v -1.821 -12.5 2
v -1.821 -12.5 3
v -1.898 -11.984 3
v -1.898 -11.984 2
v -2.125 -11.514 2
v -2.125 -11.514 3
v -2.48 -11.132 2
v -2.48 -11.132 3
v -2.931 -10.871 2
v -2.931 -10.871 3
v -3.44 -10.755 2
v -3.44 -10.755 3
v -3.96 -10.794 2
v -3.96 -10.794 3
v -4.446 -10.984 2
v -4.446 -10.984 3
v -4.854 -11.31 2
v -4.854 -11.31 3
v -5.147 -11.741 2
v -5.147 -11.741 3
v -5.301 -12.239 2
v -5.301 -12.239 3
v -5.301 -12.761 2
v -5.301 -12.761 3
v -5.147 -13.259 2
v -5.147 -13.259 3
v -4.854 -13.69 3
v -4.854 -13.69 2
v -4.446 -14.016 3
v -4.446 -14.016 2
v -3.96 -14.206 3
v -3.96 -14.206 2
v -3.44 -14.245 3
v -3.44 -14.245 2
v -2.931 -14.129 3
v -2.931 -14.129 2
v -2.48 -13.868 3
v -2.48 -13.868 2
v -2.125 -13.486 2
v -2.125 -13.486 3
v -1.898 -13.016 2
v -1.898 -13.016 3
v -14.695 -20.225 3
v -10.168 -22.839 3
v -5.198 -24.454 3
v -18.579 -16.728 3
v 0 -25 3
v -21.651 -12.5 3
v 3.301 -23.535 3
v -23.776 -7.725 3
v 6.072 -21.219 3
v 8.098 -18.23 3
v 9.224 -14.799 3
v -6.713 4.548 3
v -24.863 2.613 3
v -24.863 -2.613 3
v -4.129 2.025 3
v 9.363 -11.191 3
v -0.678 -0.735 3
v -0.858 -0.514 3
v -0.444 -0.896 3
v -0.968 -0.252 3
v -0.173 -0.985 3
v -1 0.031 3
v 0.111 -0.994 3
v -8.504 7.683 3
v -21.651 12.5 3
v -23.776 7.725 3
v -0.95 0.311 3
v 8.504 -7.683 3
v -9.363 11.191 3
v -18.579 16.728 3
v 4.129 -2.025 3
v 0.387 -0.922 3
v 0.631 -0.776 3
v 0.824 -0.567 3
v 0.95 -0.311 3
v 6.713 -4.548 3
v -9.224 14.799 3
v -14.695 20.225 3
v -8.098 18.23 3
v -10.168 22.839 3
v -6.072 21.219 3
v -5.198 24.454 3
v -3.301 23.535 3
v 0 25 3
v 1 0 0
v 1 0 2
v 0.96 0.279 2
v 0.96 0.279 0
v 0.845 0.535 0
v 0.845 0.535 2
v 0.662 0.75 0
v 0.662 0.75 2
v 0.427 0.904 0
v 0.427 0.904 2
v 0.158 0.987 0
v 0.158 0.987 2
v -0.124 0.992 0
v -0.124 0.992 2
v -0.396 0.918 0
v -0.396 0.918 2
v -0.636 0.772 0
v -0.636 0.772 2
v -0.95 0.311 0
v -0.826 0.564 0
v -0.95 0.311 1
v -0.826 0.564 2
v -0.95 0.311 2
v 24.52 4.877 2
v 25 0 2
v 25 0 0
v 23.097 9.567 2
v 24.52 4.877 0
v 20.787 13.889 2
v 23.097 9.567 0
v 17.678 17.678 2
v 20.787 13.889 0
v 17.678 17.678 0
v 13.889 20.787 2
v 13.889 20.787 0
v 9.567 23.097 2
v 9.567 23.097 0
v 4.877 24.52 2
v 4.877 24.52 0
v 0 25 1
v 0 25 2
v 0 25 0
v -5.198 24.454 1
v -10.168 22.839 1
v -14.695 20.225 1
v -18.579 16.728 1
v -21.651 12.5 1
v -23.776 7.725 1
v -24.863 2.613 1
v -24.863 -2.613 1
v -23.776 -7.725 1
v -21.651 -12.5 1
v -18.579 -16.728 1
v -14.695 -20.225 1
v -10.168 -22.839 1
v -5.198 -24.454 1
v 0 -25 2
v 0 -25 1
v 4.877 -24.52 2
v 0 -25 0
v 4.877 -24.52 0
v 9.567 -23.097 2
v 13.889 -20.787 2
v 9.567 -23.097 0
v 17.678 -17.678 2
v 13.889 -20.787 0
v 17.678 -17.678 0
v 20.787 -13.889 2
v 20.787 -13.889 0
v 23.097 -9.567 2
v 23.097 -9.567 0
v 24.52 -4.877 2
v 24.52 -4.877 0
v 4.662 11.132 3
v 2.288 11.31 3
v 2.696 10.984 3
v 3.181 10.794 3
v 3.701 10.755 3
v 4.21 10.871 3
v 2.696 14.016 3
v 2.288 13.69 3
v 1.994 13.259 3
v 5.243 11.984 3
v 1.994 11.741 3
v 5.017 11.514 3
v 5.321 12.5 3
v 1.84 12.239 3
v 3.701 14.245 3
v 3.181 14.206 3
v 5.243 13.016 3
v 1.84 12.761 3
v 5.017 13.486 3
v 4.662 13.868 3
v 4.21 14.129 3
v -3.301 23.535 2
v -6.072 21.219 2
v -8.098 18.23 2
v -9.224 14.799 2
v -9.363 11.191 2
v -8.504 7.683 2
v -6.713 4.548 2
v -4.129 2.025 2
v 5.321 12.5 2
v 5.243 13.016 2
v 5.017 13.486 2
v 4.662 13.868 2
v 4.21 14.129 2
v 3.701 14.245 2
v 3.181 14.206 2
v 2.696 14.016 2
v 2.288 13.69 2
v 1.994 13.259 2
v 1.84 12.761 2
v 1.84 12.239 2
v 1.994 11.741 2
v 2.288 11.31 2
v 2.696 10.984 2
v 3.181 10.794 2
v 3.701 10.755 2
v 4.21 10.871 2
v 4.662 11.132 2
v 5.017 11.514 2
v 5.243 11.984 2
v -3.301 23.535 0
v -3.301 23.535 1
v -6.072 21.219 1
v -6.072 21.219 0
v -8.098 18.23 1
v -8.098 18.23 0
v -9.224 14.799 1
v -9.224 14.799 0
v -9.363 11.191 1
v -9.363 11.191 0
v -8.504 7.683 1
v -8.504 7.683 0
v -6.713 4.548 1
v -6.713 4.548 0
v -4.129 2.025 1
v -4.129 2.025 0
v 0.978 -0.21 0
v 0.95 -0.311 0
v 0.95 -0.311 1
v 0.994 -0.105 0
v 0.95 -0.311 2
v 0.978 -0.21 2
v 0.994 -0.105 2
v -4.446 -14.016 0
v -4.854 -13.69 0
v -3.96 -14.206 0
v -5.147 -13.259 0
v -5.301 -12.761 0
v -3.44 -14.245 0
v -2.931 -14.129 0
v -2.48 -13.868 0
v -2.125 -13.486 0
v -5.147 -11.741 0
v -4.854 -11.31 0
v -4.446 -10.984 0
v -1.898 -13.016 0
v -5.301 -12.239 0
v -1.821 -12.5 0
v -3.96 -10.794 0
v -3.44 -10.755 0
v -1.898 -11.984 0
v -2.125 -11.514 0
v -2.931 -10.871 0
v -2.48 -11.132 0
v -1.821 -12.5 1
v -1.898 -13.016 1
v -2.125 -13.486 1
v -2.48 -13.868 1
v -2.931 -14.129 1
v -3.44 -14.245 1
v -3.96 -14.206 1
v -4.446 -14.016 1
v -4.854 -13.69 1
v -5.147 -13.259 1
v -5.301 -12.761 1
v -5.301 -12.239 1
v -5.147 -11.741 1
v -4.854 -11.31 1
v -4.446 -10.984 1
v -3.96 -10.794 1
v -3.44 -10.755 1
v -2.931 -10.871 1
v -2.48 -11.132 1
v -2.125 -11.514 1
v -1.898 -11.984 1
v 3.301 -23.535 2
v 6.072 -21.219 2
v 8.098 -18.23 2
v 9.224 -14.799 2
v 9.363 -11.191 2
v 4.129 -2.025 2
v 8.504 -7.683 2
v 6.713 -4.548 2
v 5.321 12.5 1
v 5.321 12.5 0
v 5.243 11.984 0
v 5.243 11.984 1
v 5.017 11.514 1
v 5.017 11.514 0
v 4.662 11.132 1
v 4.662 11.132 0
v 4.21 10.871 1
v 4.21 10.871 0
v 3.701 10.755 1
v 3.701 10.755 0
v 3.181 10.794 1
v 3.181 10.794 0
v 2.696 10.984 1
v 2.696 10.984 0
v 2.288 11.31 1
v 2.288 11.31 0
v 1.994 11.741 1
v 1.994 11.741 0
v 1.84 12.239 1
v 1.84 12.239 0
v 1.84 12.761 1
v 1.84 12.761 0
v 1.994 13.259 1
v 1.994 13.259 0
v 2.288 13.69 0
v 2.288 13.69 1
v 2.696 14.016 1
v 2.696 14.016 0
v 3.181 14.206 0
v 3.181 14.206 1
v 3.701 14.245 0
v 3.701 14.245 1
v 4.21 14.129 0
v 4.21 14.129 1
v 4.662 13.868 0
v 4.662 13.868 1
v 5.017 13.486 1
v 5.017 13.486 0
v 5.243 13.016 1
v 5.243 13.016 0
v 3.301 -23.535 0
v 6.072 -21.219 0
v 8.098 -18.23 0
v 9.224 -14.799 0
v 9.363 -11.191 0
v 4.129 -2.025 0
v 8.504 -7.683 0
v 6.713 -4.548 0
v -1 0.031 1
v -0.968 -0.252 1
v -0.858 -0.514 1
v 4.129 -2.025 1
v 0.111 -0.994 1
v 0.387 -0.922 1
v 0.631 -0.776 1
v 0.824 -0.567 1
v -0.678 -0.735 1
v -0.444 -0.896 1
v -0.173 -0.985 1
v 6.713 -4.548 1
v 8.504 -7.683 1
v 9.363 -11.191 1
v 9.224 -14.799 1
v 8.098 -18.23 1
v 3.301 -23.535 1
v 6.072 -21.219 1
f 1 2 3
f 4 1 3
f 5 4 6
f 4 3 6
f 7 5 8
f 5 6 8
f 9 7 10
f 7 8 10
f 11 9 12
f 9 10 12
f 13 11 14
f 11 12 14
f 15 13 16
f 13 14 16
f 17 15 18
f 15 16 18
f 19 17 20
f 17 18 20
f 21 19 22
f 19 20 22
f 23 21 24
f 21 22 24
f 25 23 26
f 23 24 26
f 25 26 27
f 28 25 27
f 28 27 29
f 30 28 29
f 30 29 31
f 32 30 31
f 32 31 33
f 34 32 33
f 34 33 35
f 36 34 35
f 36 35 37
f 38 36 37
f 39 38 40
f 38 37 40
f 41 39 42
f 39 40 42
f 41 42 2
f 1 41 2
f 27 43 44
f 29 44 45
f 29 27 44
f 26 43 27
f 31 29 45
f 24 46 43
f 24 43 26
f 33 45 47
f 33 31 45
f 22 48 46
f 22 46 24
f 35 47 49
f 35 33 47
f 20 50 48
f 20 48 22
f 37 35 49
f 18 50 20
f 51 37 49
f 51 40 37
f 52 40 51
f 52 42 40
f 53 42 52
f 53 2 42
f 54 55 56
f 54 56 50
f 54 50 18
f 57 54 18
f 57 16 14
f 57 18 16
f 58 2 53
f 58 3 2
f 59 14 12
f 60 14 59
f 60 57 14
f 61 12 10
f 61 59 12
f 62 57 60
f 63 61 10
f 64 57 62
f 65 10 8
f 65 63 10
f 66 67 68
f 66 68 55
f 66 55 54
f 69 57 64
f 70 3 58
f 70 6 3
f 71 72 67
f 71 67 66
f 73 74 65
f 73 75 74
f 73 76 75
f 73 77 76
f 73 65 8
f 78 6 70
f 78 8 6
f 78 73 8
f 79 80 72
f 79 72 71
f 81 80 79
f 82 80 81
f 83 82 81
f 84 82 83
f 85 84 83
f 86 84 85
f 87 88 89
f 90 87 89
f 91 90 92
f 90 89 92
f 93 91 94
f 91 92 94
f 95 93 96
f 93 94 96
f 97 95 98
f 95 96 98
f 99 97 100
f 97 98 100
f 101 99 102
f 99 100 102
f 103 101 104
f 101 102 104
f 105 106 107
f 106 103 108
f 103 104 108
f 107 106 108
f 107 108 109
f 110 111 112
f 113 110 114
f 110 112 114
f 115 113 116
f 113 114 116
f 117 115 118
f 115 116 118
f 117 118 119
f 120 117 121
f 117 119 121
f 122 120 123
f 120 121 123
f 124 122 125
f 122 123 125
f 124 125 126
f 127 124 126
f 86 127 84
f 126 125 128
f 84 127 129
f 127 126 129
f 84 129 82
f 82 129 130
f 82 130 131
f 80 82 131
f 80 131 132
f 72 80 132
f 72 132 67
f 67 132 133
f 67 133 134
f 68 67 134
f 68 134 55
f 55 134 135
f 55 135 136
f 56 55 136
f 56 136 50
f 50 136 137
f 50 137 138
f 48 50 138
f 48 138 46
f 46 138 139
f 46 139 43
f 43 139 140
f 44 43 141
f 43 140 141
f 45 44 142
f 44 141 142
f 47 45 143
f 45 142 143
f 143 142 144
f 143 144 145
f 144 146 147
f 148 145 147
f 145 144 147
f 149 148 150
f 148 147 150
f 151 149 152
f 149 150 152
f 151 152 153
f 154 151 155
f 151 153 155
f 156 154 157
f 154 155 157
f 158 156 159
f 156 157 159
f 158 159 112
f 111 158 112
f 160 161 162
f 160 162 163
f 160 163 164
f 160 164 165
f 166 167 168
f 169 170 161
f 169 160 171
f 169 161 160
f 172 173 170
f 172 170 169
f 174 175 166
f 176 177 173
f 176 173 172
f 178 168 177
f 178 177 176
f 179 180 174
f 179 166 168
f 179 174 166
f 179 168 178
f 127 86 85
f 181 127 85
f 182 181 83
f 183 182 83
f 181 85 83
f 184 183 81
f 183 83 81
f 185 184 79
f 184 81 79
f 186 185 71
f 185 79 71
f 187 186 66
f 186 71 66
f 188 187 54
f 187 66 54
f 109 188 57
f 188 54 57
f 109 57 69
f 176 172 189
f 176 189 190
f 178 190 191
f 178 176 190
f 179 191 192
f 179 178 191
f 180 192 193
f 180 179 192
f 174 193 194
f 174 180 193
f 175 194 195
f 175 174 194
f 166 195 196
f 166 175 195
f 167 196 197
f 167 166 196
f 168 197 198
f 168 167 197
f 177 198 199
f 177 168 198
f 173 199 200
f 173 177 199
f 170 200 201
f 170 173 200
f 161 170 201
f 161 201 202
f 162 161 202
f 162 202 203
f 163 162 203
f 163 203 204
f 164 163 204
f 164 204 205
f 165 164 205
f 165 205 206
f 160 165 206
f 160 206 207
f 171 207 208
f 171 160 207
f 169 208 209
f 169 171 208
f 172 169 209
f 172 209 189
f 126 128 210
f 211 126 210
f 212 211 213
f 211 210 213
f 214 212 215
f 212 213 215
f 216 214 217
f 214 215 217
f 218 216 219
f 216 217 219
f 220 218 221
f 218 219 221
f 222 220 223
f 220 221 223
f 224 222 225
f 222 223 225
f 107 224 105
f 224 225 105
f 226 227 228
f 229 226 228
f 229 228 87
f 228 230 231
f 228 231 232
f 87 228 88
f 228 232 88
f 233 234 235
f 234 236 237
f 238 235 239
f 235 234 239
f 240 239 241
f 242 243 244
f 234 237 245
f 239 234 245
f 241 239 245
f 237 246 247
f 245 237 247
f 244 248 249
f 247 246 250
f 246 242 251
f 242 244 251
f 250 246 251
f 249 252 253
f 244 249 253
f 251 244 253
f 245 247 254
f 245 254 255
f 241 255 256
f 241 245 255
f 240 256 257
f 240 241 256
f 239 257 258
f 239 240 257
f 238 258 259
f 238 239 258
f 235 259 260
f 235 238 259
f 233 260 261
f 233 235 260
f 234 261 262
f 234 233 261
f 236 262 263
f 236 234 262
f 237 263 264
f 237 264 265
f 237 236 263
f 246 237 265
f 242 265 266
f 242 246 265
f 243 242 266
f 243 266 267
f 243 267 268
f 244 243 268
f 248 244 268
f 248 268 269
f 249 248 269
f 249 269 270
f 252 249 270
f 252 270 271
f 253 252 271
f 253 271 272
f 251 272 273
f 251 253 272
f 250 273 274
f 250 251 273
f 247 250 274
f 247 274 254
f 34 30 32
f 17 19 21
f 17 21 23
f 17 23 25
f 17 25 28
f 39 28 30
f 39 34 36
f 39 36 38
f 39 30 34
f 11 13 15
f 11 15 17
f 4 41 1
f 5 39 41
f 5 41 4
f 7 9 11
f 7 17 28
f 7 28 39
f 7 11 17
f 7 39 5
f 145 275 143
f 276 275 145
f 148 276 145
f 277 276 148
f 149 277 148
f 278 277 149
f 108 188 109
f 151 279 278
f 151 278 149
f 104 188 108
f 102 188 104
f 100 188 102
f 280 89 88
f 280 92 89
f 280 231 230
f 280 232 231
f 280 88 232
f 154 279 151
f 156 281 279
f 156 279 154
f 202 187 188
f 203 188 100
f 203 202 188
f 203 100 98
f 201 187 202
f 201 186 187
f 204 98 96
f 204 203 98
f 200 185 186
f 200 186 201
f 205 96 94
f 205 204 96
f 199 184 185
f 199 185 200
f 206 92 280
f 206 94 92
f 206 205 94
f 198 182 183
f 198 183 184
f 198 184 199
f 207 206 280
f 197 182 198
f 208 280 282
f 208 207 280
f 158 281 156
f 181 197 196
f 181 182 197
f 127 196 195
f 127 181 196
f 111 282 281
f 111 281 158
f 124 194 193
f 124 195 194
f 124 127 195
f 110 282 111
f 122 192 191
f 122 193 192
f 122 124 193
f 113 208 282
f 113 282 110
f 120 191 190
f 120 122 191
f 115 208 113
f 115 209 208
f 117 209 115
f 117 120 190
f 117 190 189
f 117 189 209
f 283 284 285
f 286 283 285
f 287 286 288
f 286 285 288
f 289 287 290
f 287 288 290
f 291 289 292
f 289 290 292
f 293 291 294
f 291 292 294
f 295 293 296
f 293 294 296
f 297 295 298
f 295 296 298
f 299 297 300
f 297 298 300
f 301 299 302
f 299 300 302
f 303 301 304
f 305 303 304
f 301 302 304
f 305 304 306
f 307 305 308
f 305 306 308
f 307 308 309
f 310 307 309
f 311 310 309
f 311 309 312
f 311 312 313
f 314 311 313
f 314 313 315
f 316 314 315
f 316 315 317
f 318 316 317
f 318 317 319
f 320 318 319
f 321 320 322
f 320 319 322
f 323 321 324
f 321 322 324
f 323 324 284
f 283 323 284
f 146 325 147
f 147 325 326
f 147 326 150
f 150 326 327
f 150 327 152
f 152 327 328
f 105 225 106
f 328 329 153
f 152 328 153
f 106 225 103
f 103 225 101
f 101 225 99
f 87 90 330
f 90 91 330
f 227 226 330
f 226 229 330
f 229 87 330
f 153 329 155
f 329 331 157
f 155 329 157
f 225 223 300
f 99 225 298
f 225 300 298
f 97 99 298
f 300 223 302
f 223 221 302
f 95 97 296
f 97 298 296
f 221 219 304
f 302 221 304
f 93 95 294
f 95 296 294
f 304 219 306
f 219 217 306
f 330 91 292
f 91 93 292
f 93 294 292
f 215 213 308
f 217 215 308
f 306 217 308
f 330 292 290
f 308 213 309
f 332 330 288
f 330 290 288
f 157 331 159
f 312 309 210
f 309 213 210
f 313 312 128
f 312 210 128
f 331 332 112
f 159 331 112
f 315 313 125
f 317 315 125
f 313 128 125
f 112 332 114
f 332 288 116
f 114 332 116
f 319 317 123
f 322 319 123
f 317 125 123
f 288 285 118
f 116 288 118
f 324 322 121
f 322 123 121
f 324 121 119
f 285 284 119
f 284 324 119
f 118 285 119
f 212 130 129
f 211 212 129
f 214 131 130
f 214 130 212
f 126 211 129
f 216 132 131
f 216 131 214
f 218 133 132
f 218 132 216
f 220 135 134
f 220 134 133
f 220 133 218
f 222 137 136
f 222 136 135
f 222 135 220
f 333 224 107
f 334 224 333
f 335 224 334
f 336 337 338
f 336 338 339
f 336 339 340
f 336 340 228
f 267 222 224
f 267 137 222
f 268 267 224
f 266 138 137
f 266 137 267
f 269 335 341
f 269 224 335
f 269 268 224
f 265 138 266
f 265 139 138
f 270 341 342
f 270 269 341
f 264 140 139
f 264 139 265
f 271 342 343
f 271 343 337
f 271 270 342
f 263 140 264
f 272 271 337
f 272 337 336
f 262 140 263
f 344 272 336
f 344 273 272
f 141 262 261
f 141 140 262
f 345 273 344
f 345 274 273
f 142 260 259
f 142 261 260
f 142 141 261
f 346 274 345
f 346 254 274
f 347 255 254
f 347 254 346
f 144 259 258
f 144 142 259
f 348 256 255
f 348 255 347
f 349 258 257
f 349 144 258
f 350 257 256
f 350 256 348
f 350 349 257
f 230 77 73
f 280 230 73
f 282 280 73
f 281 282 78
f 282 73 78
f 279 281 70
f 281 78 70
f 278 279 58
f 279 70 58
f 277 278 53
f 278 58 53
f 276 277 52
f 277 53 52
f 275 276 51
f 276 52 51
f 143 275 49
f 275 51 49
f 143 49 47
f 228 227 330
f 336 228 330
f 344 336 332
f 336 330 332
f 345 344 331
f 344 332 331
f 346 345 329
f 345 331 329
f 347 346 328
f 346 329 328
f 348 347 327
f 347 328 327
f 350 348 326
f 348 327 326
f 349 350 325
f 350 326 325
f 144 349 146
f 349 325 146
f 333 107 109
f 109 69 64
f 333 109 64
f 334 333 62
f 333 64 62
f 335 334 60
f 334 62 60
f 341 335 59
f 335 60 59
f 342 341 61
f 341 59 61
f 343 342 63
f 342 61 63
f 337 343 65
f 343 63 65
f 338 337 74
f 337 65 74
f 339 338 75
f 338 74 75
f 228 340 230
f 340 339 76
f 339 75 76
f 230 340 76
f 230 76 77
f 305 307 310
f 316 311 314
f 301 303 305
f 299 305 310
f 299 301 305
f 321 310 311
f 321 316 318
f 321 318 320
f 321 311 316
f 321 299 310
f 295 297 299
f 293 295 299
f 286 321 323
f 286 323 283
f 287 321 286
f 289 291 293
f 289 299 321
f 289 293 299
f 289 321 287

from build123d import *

# Parameters (mm, degrees)
F0_R     = 25
F1_DEPTH = 3
F2_R     = 1.75
F3_DEPTH = 1
F4_R     = 1.75
F5_DEPTH = 1
F7_DEPTH = 25


with BuildPart() as f1:
    # F0 (on Top) → F1 (new body)
    with BuildSketch(Plane.XY):
        Circle(F0_R)
    extrude(amount=F1_DEPTH)

    # F2 (on face) → F3 (cut)
    with BuildSketch(Plane.XY.offset(3)):
        with BuildLine():
            ThreePointArc((0, -25), (17.67767, -17.67767), (25, 0))
            ThreePointArc((25, 0), (17.67767, 17.67767), (0, 25))
            ThreePointArc((0, 25), (-9.429286, 12.5), (0, 0))
            ThreePointArc((0, 0), (9.429286, -12.5), (0, -25))
        make_face()
        with Locations((3.570714, 12.5)):
            Circle(F2_R, mode=Mode.SUBTRACT)
        with Locations((-3.570714, -12.5)):
            Circle(F2_R)
    extrude(amount=-F3_DEPTH, mode=Mode.SUBTRACT)

    # F4 (on face) → F5 (cut)
    with BuildSketch(Plane(origin=(0, 0, 0), x_dir=(1, 0, 0), z_dir=(0, 0, -1))):
        with BuildLine():
            ThreePointArc((0, 0), (9.429286, 12.5), (0, 25))
            ThreePointArc((0, 25), (-25, 0), (0, -25))
            ThreePointArc((0, -25), (-9.429286, -12.5), (0, 0))
        make_face()
        with Locations((-3.570714, 12.5)):
            Circle(F4_R, mode=Mode.SUBTRACT)
        with Locations((3.570714, -12.5)):
            Circle(F4_R)
    extrude(amount=-F5_DEPTH, mode=Mode.SUBTRACT)

    # F6 (on face) → F7 (cut)
    with BuildSketch(Plane.XY.offset(3)):
        with BuildLine():
            ThreePointArc((0, 0), (-0.478127, 0.146584), (-0.950263, 0.311449))
            ThreePointArc((-0.950263, 0.311449), (-0.311449, -0.950263), (0.950263, -0.311449))
            ThreePointArc((0.950263, -0.311449), (0.478127, -0.146584), (0, 0))
        make_face()
        with BuildLine():
            ThreePointArc((0.950263, -0.311449), (0.987487, -0.157698), (1, 0))
            ThreePointArc((1, 0), (0.157698, 0.987487), (-0.950263, 0.311449))
            ThreePointArc((-0.950263, 0.311449), (-0.478127, 0.146584), (0, 0))
            ThreePointArc((0, 0), (0.478127, -0.146584), (0.950263, -0.311449))
        make_face()
    extrude(amount=-F7_DEPTH, mode=Mode.SUBTRACT)


solid = f1.part
